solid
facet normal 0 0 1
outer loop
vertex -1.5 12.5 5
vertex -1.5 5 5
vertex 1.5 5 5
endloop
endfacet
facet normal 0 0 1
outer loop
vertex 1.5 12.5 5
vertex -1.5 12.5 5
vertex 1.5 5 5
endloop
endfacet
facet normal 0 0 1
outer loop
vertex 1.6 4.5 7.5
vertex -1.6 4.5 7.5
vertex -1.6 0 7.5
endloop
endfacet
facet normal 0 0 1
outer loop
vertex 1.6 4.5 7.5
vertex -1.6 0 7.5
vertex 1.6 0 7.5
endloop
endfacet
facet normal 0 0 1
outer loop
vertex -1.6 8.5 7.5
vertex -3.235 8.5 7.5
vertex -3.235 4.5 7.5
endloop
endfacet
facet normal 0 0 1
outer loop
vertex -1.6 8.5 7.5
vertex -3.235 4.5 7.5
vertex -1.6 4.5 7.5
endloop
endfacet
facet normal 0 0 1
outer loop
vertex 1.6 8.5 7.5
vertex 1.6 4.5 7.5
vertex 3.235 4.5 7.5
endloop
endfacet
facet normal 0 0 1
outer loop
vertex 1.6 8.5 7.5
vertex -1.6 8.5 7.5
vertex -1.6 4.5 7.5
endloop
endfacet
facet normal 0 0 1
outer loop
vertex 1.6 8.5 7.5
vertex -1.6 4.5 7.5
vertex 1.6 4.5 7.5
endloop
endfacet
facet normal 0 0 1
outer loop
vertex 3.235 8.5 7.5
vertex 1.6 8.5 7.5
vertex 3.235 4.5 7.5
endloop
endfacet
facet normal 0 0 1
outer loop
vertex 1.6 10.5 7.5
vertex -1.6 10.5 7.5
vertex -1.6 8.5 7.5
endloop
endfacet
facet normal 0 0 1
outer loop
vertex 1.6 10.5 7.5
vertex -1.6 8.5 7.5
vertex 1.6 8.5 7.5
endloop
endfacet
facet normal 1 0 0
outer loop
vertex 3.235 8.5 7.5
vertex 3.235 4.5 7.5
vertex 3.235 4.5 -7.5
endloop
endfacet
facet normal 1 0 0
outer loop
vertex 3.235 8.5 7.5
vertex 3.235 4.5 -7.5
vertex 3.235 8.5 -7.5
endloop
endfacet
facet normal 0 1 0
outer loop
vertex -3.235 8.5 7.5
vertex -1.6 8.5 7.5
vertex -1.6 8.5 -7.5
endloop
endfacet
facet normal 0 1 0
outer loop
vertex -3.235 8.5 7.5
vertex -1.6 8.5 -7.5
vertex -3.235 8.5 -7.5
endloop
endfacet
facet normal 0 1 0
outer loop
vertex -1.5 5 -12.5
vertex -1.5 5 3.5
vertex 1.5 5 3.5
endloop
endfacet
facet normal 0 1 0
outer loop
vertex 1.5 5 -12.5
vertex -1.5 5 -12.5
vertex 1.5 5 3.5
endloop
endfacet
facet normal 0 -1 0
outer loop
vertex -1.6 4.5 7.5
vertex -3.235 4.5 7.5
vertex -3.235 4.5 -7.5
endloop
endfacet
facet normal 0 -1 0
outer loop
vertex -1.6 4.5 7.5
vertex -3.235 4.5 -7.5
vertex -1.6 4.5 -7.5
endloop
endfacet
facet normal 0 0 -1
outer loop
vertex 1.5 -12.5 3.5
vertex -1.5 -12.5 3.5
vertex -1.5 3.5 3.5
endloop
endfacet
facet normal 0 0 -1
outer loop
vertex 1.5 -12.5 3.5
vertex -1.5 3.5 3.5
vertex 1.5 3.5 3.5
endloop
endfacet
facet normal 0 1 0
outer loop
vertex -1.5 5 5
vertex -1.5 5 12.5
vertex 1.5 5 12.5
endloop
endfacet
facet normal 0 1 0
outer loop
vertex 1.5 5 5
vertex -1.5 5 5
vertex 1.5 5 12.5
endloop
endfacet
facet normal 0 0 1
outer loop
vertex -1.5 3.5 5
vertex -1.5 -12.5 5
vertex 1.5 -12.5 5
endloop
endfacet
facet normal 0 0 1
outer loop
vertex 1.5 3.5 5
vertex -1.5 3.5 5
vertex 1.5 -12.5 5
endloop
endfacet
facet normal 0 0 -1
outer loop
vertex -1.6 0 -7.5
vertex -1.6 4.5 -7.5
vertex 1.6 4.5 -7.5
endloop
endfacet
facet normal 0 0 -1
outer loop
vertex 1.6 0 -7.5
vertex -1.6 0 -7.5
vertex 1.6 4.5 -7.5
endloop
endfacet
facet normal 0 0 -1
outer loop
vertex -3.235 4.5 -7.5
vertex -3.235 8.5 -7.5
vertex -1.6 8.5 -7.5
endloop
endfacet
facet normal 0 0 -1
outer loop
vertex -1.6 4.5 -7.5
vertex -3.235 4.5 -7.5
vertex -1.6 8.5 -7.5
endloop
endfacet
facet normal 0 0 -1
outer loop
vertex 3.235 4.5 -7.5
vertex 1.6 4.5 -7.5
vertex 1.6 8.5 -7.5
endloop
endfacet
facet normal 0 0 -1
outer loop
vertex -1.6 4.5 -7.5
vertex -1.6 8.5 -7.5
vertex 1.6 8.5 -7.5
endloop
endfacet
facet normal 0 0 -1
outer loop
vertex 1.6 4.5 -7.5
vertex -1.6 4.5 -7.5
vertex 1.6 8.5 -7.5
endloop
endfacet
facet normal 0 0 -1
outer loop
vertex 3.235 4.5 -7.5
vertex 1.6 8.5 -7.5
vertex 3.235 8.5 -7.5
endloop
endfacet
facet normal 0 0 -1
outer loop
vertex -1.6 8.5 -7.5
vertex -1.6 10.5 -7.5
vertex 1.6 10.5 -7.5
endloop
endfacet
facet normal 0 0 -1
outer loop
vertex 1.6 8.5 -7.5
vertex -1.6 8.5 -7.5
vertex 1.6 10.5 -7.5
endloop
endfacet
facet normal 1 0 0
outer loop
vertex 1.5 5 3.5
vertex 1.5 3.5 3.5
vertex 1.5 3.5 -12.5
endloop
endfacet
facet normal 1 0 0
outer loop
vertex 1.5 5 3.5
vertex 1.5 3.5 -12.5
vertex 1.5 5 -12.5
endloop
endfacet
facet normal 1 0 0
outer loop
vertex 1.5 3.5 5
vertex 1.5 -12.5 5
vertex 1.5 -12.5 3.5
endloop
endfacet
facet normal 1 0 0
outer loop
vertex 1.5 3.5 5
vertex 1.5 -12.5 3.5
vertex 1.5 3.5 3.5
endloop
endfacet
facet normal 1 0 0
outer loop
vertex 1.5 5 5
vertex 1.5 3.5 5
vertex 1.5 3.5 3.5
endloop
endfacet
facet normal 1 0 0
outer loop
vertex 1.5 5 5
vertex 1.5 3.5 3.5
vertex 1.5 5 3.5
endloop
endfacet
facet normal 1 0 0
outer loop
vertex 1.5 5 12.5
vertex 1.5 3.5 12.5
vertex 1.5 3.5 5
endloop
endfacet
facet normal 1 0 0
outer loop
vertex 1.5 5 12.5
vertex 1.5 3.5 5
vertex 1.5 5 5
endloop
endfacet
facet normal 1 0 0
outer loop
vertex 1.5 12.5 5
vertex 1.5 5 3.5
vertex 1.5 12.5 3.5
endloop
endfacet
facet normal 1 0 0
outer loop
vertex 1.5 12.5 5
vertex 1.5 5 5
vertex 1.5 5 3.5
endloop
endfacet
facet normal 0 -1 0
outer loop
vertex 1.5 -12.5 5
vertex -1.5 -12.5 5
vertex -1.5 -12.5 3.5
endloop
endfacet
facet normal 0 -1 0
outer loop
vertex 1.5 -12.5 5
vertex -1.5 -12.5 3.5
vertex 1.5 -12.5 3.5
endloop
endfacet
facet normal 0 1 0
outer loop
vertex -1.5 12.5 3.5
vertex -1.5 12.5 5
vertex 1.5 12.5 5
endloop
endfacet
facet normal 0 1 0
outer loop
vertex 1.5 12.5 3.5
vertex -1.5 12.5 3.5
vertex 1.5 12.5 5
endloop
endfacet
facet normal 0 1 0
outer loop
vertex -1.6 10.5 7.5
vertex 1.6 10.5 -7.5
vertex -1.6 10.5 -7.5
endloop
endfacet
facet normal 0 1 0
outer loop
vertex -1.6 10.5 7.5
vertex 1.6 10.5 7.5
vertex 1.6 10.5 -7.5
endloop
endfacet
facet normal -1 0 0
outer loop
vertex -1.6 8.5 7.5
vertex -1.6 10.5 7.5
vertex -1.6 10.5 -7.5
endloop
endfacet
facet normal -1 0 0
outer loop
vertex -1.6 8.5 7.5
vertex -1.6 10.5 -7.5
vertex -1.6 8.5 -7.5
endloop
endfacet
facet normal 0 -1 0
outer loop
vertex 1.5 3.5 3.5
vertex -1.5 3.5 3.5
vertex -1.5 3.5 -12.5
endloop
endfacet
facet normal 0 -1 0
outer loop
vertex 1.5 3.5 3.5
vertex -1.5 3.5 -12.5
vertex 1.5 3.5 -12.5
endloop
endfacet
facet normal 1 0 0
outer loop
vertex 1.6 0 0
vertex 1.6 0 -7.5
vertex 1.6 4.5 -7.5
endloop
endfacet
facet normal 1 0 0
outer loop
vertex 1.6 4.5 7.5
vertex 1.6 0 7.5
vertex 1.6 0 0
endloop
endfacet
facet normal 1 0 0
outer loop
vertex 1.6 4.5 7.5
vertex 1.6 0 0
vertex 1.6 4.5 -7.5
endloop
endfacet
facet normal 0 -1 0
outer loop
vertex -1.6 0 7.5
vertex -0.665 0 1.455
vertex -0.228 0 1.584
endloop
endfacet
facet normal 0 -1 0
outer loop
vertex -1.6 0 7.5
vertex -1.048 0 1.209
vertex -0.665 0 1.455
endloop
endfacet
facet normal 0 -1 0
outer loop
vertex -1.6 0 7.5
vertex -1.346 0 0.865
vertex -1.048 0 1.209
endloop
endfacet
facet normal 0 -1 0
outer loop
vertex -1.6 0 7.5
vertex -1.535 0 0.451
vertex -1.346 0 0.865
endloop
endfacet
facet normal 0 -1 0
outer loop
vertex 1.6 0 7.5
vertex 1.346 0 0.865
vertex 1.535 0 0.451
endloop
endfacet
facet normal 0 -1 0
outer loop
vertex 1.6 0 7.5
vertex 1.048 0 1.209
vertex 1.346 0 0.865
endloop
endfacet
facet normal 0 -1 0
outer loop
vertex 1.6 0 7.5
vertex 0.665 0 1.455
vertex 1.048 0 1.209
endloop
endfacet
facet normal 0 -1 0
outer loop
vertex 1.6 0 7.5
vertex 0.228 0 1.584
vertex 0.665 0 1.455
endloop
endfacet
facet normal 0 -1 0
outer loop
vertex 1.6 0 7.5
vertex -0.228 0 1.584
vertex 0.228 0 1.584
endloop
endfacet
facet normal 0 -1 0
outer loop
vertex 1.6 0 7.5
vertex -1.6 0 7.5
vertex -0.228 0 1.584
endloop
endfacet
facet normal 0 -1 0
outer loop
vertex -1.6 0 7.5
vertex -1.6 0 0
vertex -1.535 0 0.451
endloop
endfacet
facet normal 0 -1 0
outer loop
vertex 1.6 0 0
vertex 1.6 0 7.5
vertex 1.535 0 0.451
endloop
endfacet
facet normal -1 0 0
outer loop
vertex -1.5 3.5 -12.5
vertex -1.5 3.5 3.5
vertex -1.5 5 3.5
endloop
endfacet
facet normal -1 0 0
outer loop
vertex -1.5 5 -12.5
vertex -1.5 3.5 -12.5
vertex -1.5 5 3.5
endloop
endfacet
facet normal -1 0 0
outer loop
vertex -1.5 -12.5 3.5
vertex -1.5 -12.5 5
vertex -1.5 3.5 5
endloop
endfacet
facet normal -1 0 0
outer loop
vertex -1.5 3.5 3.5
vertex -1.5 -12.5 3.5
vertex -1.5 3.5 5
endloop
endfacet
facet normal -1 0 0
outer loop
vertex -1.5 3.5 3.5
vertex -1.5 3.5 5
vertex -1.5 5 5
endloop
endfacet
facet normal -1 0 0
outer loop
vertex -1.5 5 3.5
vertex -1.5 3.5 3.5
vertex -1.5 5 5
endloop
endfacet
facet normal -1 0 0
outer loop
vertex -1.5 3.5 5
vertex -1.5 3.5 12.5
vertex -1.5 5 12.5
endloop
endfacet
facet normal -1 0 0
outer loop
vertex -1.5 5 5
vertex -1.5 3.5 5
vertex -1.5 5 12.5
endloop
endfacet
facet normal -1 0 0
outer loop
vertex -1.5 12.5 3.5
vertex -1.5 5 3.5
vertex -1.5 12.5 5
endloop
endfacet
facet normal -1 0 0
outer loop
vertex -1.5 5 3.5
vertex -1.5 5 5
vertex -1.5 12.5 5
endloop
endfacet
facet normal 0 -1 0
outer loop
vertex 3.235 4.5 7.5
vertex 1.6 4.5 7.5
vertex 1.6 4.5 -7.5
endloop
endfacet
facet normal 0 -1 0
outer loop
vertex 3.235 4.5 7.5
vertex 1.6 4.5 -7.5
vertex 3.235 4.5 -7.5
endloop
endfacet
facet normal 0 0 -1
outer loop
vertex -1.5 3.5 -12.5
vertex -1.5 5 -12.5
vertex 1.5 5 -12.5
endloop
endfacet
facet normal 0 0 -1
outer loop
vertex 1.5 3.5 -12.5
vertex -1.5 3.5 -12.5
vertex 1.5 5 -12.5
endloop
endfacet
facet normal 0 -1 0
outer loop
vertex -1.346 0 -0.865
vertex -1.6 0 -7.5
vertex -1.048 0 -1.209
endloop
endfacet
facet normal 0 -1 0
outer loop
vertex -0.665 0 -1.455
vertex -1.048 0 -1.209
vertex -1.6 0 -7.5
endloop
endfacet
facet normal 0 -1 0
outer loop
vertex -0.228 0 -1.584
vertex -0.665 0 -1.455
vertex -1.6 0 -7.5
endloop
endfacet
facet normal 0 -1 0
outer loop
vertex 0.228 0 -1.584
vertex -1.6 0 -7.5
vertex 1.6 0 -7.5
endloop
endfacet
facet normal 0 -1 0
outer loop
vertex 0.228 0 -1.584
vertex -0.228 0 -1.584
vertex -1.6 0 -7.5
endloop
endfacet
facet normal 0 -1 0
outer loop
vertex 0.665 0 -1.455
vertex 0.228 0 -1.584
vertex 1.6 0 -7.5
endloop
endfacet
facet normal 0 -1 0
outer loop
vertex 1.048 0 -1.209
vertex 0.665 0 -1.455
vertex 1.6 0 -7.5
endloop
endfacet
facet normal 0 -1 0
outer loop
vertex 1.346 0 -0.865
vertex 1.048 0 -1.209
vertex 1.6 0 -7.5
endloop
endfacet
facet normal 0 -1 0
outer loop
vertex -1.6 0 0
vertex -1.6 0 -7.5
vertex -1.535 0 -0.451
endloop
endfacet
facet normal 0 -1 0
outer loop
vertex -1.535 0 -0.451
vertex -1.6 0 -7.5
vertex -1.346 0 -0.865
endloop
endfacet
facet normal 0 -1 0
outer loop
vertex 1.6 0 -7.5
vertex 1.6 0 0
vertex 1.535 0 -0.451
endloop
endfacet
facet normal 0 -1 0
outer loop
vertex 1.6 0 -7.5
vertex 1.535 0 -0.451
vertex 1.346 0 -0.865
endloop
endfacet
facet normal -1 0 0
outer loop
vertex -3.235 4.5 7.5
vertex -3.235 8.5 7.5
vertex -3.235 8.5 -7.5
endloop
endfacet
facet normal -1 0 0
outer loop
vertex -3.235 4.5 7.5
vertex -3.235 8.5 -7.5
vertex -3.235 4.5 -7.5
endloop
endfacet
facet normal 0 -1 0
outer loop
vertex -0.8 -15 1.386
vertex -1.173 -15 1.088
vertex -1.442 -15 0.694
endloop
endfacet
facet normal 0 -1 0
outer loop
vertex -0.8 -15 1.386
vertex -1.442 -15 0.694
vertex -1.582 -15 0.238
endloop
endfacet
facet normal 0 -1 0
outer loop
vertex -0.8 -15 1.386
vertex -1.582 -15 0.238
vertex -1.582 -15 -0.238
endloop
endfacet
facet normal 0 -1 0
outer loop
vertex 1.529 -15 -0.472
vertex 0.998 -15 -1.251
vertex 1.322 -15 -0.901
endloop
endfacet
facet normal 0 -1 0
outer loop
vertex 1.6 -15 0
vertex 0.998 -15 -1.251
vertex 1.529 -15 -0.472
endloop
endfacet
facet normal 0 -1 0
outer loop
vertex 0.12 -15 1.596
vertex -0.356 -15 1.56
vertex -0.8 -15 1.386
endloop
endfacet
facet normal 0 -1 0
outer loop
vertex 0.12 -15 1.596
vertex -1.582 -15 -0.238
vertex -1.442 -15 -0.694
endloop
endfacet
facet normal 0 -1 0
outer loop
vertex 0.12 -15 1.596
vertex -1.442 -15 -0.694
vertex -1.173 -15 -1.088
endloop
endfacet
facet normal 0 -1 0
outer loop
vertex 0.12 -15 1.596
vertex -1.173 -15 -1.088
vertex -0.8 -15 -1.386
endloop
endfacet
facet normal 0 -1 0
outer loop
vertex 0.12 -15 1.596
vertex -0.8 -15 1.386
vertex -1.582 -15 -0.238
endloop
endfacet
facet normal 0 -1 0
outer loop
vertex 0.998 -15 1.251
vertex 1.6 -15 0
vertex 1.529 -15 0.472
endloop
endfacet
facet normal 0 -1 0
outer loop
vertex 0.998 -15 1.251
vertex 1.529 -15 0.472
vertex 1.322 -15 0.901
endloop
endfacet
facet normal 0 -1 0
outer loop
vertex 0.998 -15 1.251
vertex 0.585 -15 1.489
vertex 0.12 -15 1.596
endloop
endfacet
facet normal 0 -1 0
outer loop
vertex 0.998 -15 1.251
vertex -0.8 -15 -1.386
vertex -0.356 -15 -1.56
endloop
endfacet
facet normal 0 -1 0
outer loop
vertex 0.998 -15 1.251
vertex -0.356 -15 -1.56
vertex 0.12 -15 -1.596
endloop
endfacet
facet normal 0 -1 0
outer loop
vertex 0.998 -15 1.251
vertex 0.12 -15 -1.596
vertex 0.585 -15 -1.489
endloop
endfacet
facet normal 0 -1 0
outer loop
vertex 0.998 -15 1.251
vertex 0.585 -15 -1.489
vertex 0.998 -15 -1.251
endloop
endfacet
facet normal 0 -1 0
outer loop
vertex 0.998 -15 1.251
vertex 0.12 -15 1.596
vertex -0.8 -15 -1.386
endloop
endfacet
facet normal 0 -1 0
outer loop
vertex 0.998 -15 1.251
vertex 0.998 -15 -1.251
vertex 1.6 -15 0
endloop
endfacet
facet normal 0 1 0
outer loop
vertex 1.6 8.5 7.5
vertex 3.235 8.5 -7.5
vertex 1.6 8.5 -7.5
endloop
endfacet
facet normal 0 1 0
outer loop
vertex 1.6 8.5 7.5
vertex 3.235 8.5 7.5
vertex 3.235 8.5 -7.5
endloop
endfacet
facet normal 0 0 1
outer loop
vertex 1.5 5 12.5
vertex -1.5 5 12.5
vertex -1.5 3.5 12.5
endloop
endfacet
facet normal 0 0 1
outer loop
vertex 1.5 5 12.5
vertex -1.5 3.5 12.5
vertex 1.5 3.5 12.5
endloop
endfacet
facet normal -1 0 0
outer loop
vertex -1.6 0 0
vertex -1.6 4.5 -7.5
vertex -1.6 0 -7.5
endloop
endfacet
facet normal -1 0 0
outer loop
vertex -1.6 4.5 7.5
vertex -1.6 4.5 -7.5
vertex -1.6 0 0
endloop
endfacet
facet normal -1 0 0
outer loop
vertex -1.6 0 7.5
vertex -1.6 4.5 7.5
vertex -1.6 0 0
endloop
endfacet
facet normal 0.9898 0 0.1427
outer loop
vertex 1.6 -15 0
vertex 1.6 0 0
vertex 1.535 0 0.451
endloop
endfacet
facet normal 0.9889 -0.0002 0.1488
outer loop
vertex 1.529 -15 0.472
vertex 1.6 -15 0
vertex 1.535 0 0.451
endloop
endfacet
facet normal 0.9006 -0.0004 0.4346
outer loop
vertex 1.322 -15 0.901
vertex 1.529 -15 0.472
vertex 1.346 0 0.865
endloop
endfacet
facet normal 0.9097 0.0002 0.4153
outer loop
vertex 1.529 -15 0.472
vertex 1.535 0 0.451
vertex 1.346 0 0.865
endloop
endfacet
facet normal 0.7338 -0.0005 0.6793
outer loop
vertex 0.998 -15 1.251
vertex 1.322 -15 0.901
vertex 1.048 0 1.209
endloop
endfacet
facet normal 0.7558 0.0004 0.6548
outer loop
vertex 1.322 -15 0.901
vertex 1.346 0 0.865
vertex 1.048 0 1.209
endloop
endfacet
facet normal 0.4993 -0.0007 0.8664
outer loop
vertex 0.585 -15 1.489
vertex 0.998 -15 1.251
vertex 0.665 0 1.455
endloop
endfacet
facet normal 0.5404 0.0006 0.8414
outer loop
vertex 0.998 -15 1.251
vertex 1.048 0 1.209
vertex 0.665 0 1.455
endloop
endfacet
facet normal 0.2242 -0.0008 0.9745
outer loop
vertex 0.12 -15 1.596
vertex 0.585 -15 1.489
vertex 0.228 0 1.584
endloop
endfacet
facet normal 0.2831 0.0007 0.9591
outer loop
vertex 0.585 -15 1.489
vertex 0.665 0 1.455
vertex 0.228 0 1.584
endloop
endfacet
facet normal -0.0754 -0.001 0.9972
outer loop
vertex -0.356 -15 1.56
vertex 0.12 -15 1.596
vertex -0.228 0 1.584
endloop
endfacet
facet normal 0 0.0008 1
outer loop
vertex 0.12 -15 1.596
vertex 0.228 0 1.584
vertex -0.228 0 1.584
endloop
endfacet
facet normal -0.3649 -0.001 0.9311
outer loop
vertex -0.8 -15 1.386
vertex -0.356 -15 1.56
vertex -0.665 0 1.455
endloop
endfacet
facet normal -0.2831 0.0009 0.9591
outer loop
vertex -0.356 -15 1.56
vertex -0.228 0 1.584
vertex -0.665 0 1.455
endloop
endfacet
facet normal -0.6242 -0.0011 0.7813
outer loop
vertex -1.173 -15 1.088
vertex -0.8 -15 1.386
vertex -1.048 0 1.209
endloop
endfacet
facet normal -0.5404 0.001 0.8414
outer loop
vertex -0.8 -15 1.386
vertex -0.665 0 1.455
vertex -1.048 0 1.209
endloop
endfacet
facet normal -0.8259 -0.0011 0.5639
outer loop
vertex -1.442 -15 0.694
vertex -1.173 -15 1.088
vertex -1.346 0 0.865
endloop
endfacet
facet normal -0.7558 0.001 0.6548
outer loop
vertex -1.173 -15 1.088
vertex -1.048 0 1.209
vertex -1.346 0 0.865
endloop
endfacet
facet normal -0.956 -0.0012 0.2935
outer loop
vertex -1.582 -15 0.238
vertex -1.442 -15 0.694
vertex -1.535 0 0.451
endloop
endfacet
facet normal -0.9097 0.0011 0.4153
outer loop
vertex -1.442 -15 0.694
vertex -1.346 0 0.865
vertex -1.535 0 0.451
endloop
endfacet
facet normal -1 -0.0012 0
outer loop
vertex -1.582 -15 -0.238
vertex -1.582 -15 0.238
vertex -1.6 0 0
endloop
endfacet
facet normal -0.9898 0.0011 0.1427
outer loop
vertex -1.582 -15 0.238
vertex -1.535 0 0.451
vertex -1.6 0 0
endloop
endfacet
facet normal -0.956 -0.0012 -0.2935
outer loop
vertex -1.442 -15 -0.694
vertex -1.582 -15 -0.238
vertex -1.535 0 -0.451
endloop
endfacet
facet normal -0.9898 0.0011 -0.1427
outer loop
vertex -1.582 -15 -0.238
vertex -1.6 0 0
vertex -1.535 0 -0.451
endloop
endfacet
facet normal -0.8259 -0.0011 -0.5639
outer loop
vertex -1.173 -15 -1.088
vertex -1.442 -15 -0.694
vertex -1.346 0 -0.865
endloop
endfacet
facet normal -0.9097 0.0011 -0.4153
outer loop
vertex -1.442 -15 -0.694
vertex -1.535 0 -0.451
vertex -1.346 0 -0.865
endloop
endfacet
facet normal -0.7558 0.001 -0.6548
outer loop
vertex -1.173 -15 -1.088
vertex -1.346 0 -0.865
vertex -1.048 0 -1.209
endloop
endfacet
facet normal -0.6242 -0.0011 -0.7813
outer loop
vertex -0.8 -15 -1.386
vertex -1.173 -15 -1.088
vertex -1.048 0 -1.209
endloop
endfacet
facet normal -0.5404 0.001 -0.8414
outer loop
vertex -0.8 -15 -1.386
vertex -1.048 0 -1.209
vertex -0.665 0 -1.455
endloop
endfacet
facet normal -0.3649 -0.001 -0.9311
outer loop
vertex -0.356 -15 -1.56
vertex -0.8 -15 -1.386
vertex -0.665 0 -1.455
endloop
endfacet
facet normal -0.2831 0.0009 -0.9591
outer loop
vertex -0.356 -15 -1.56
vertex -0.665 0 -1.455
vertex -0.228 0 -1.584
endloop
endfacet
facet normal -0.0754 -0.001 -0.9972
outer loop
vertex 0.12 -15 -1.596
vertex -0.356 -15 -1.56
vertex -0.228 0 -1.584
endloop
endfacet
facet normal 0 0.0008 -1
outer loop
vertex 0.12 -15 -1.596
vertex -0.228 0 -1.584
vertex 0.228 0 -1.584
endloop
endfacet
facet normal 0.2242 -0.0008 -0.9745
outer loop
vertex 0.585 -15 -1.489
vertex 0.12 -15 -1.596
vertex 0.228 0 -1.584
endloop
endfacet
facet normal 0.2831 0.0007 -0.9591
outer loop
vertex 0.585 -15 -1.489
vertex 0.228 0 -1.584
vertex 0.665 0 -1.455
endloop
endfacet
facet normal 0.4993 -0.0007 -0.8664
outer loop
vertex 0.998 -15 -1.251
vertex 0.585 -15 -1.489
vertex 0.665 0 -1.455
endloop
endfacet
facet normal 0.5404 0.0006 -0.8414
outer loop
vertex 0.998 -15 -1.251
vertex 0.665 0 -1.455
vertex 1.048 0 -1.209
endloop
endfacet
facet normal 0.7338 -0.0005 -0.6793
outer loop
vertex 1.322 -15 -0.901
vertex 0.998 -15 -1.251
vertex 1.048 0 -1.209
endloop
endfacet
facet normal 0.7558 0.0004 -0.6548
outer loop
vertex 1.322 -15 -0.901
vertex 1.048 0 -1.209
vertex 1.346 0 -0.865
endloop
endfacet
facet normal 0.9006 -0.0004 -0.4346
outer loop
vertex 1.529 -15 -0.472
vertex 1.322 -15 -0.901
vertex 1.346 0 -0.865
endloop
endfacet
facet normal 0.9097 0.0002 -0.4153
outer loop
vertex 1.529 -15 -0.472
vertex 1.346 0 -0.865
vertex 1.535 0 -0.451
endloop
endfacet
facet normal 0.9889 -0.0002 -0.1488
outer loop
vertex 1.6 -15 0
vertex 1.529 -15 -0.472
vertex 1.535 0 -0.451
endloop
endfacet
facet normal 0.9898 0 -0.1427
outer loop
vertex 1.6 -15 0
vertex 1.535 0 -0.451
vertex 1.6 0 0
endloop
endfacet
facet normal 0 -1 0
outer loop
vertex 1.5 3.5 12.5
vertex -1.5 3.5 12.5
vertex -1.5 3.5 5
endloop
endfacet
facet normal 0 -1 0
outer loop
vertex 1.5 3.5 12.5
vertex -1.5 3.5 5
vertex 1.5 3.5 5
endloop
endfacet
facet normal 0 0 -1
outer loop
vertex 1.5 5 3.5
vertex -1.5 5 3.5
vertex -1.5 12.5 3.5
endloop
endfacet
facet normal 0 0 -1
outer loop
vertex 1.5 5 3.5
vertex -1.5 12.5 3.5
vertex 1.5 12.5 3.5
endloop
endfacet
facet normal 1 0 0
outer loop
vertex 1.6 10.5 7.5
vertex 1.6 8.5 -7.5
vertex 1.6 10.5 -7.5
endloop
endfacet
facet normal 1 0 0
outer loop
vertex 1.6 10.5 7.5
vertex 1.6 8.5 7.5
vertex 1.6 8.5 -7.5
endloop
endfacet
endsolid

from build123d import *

# Parameters (mm, degrees)
F1_DEPTH = 7.5
F2_R     = 1.6
F3_DEPTH = 15
F4_W     = 3
F4_H     = 1.5
F5_DEPTH = 12.5
F6_W     = 3
F6_H     = 1.5
F7_DEPTH = 12.5


with BuildPart() as f1:
    # F0 (on Top) → F1 (new body, symmetric)
    with BuildSketch(Plane.XY):
        Polygon((1.6, 10.5), (0, 10.5), (-1.6, 10.5), (-1.6, 8.5), (-3.2350461341, 8.5), (-3.2350461341, 4.5), (-1.6, 4.5), (-1.6, 0), (0, 0), (1.6, 0), (1.6, 4.5), (3.2350461341, 4.5), (3.2350461341, 8.5), (1.6, 8.5), align=None)
    extrude(amount=F1_DEPTH, both=True)

    # F2 (on Front) → F3 (join)
    with BuildSketch(Plane.XZ):
        Circle(F2_R)
    extrude(amount=F3_DEPTH)


with BuildPart() as f5:
    # F4 (on Front) → F5 (new body, symmetric)
    with BuildSketch(Plane.XZ):
        with Locations((0, 4.25)):
            Rectangle(F4_W, F4_H)
    extrude(amount=F5_DEPTH, both=True)

    # F6 (on Top) → F7 (join, symmetric)
    with BuildSketch(Plane.XY):
        with Locations((0, 4.25)):
            Rectangle(F6_W, F6_H)
    extrude(amount=F7_DEPTH, both=True)


solid = Compound([f1.part, f5.part])
